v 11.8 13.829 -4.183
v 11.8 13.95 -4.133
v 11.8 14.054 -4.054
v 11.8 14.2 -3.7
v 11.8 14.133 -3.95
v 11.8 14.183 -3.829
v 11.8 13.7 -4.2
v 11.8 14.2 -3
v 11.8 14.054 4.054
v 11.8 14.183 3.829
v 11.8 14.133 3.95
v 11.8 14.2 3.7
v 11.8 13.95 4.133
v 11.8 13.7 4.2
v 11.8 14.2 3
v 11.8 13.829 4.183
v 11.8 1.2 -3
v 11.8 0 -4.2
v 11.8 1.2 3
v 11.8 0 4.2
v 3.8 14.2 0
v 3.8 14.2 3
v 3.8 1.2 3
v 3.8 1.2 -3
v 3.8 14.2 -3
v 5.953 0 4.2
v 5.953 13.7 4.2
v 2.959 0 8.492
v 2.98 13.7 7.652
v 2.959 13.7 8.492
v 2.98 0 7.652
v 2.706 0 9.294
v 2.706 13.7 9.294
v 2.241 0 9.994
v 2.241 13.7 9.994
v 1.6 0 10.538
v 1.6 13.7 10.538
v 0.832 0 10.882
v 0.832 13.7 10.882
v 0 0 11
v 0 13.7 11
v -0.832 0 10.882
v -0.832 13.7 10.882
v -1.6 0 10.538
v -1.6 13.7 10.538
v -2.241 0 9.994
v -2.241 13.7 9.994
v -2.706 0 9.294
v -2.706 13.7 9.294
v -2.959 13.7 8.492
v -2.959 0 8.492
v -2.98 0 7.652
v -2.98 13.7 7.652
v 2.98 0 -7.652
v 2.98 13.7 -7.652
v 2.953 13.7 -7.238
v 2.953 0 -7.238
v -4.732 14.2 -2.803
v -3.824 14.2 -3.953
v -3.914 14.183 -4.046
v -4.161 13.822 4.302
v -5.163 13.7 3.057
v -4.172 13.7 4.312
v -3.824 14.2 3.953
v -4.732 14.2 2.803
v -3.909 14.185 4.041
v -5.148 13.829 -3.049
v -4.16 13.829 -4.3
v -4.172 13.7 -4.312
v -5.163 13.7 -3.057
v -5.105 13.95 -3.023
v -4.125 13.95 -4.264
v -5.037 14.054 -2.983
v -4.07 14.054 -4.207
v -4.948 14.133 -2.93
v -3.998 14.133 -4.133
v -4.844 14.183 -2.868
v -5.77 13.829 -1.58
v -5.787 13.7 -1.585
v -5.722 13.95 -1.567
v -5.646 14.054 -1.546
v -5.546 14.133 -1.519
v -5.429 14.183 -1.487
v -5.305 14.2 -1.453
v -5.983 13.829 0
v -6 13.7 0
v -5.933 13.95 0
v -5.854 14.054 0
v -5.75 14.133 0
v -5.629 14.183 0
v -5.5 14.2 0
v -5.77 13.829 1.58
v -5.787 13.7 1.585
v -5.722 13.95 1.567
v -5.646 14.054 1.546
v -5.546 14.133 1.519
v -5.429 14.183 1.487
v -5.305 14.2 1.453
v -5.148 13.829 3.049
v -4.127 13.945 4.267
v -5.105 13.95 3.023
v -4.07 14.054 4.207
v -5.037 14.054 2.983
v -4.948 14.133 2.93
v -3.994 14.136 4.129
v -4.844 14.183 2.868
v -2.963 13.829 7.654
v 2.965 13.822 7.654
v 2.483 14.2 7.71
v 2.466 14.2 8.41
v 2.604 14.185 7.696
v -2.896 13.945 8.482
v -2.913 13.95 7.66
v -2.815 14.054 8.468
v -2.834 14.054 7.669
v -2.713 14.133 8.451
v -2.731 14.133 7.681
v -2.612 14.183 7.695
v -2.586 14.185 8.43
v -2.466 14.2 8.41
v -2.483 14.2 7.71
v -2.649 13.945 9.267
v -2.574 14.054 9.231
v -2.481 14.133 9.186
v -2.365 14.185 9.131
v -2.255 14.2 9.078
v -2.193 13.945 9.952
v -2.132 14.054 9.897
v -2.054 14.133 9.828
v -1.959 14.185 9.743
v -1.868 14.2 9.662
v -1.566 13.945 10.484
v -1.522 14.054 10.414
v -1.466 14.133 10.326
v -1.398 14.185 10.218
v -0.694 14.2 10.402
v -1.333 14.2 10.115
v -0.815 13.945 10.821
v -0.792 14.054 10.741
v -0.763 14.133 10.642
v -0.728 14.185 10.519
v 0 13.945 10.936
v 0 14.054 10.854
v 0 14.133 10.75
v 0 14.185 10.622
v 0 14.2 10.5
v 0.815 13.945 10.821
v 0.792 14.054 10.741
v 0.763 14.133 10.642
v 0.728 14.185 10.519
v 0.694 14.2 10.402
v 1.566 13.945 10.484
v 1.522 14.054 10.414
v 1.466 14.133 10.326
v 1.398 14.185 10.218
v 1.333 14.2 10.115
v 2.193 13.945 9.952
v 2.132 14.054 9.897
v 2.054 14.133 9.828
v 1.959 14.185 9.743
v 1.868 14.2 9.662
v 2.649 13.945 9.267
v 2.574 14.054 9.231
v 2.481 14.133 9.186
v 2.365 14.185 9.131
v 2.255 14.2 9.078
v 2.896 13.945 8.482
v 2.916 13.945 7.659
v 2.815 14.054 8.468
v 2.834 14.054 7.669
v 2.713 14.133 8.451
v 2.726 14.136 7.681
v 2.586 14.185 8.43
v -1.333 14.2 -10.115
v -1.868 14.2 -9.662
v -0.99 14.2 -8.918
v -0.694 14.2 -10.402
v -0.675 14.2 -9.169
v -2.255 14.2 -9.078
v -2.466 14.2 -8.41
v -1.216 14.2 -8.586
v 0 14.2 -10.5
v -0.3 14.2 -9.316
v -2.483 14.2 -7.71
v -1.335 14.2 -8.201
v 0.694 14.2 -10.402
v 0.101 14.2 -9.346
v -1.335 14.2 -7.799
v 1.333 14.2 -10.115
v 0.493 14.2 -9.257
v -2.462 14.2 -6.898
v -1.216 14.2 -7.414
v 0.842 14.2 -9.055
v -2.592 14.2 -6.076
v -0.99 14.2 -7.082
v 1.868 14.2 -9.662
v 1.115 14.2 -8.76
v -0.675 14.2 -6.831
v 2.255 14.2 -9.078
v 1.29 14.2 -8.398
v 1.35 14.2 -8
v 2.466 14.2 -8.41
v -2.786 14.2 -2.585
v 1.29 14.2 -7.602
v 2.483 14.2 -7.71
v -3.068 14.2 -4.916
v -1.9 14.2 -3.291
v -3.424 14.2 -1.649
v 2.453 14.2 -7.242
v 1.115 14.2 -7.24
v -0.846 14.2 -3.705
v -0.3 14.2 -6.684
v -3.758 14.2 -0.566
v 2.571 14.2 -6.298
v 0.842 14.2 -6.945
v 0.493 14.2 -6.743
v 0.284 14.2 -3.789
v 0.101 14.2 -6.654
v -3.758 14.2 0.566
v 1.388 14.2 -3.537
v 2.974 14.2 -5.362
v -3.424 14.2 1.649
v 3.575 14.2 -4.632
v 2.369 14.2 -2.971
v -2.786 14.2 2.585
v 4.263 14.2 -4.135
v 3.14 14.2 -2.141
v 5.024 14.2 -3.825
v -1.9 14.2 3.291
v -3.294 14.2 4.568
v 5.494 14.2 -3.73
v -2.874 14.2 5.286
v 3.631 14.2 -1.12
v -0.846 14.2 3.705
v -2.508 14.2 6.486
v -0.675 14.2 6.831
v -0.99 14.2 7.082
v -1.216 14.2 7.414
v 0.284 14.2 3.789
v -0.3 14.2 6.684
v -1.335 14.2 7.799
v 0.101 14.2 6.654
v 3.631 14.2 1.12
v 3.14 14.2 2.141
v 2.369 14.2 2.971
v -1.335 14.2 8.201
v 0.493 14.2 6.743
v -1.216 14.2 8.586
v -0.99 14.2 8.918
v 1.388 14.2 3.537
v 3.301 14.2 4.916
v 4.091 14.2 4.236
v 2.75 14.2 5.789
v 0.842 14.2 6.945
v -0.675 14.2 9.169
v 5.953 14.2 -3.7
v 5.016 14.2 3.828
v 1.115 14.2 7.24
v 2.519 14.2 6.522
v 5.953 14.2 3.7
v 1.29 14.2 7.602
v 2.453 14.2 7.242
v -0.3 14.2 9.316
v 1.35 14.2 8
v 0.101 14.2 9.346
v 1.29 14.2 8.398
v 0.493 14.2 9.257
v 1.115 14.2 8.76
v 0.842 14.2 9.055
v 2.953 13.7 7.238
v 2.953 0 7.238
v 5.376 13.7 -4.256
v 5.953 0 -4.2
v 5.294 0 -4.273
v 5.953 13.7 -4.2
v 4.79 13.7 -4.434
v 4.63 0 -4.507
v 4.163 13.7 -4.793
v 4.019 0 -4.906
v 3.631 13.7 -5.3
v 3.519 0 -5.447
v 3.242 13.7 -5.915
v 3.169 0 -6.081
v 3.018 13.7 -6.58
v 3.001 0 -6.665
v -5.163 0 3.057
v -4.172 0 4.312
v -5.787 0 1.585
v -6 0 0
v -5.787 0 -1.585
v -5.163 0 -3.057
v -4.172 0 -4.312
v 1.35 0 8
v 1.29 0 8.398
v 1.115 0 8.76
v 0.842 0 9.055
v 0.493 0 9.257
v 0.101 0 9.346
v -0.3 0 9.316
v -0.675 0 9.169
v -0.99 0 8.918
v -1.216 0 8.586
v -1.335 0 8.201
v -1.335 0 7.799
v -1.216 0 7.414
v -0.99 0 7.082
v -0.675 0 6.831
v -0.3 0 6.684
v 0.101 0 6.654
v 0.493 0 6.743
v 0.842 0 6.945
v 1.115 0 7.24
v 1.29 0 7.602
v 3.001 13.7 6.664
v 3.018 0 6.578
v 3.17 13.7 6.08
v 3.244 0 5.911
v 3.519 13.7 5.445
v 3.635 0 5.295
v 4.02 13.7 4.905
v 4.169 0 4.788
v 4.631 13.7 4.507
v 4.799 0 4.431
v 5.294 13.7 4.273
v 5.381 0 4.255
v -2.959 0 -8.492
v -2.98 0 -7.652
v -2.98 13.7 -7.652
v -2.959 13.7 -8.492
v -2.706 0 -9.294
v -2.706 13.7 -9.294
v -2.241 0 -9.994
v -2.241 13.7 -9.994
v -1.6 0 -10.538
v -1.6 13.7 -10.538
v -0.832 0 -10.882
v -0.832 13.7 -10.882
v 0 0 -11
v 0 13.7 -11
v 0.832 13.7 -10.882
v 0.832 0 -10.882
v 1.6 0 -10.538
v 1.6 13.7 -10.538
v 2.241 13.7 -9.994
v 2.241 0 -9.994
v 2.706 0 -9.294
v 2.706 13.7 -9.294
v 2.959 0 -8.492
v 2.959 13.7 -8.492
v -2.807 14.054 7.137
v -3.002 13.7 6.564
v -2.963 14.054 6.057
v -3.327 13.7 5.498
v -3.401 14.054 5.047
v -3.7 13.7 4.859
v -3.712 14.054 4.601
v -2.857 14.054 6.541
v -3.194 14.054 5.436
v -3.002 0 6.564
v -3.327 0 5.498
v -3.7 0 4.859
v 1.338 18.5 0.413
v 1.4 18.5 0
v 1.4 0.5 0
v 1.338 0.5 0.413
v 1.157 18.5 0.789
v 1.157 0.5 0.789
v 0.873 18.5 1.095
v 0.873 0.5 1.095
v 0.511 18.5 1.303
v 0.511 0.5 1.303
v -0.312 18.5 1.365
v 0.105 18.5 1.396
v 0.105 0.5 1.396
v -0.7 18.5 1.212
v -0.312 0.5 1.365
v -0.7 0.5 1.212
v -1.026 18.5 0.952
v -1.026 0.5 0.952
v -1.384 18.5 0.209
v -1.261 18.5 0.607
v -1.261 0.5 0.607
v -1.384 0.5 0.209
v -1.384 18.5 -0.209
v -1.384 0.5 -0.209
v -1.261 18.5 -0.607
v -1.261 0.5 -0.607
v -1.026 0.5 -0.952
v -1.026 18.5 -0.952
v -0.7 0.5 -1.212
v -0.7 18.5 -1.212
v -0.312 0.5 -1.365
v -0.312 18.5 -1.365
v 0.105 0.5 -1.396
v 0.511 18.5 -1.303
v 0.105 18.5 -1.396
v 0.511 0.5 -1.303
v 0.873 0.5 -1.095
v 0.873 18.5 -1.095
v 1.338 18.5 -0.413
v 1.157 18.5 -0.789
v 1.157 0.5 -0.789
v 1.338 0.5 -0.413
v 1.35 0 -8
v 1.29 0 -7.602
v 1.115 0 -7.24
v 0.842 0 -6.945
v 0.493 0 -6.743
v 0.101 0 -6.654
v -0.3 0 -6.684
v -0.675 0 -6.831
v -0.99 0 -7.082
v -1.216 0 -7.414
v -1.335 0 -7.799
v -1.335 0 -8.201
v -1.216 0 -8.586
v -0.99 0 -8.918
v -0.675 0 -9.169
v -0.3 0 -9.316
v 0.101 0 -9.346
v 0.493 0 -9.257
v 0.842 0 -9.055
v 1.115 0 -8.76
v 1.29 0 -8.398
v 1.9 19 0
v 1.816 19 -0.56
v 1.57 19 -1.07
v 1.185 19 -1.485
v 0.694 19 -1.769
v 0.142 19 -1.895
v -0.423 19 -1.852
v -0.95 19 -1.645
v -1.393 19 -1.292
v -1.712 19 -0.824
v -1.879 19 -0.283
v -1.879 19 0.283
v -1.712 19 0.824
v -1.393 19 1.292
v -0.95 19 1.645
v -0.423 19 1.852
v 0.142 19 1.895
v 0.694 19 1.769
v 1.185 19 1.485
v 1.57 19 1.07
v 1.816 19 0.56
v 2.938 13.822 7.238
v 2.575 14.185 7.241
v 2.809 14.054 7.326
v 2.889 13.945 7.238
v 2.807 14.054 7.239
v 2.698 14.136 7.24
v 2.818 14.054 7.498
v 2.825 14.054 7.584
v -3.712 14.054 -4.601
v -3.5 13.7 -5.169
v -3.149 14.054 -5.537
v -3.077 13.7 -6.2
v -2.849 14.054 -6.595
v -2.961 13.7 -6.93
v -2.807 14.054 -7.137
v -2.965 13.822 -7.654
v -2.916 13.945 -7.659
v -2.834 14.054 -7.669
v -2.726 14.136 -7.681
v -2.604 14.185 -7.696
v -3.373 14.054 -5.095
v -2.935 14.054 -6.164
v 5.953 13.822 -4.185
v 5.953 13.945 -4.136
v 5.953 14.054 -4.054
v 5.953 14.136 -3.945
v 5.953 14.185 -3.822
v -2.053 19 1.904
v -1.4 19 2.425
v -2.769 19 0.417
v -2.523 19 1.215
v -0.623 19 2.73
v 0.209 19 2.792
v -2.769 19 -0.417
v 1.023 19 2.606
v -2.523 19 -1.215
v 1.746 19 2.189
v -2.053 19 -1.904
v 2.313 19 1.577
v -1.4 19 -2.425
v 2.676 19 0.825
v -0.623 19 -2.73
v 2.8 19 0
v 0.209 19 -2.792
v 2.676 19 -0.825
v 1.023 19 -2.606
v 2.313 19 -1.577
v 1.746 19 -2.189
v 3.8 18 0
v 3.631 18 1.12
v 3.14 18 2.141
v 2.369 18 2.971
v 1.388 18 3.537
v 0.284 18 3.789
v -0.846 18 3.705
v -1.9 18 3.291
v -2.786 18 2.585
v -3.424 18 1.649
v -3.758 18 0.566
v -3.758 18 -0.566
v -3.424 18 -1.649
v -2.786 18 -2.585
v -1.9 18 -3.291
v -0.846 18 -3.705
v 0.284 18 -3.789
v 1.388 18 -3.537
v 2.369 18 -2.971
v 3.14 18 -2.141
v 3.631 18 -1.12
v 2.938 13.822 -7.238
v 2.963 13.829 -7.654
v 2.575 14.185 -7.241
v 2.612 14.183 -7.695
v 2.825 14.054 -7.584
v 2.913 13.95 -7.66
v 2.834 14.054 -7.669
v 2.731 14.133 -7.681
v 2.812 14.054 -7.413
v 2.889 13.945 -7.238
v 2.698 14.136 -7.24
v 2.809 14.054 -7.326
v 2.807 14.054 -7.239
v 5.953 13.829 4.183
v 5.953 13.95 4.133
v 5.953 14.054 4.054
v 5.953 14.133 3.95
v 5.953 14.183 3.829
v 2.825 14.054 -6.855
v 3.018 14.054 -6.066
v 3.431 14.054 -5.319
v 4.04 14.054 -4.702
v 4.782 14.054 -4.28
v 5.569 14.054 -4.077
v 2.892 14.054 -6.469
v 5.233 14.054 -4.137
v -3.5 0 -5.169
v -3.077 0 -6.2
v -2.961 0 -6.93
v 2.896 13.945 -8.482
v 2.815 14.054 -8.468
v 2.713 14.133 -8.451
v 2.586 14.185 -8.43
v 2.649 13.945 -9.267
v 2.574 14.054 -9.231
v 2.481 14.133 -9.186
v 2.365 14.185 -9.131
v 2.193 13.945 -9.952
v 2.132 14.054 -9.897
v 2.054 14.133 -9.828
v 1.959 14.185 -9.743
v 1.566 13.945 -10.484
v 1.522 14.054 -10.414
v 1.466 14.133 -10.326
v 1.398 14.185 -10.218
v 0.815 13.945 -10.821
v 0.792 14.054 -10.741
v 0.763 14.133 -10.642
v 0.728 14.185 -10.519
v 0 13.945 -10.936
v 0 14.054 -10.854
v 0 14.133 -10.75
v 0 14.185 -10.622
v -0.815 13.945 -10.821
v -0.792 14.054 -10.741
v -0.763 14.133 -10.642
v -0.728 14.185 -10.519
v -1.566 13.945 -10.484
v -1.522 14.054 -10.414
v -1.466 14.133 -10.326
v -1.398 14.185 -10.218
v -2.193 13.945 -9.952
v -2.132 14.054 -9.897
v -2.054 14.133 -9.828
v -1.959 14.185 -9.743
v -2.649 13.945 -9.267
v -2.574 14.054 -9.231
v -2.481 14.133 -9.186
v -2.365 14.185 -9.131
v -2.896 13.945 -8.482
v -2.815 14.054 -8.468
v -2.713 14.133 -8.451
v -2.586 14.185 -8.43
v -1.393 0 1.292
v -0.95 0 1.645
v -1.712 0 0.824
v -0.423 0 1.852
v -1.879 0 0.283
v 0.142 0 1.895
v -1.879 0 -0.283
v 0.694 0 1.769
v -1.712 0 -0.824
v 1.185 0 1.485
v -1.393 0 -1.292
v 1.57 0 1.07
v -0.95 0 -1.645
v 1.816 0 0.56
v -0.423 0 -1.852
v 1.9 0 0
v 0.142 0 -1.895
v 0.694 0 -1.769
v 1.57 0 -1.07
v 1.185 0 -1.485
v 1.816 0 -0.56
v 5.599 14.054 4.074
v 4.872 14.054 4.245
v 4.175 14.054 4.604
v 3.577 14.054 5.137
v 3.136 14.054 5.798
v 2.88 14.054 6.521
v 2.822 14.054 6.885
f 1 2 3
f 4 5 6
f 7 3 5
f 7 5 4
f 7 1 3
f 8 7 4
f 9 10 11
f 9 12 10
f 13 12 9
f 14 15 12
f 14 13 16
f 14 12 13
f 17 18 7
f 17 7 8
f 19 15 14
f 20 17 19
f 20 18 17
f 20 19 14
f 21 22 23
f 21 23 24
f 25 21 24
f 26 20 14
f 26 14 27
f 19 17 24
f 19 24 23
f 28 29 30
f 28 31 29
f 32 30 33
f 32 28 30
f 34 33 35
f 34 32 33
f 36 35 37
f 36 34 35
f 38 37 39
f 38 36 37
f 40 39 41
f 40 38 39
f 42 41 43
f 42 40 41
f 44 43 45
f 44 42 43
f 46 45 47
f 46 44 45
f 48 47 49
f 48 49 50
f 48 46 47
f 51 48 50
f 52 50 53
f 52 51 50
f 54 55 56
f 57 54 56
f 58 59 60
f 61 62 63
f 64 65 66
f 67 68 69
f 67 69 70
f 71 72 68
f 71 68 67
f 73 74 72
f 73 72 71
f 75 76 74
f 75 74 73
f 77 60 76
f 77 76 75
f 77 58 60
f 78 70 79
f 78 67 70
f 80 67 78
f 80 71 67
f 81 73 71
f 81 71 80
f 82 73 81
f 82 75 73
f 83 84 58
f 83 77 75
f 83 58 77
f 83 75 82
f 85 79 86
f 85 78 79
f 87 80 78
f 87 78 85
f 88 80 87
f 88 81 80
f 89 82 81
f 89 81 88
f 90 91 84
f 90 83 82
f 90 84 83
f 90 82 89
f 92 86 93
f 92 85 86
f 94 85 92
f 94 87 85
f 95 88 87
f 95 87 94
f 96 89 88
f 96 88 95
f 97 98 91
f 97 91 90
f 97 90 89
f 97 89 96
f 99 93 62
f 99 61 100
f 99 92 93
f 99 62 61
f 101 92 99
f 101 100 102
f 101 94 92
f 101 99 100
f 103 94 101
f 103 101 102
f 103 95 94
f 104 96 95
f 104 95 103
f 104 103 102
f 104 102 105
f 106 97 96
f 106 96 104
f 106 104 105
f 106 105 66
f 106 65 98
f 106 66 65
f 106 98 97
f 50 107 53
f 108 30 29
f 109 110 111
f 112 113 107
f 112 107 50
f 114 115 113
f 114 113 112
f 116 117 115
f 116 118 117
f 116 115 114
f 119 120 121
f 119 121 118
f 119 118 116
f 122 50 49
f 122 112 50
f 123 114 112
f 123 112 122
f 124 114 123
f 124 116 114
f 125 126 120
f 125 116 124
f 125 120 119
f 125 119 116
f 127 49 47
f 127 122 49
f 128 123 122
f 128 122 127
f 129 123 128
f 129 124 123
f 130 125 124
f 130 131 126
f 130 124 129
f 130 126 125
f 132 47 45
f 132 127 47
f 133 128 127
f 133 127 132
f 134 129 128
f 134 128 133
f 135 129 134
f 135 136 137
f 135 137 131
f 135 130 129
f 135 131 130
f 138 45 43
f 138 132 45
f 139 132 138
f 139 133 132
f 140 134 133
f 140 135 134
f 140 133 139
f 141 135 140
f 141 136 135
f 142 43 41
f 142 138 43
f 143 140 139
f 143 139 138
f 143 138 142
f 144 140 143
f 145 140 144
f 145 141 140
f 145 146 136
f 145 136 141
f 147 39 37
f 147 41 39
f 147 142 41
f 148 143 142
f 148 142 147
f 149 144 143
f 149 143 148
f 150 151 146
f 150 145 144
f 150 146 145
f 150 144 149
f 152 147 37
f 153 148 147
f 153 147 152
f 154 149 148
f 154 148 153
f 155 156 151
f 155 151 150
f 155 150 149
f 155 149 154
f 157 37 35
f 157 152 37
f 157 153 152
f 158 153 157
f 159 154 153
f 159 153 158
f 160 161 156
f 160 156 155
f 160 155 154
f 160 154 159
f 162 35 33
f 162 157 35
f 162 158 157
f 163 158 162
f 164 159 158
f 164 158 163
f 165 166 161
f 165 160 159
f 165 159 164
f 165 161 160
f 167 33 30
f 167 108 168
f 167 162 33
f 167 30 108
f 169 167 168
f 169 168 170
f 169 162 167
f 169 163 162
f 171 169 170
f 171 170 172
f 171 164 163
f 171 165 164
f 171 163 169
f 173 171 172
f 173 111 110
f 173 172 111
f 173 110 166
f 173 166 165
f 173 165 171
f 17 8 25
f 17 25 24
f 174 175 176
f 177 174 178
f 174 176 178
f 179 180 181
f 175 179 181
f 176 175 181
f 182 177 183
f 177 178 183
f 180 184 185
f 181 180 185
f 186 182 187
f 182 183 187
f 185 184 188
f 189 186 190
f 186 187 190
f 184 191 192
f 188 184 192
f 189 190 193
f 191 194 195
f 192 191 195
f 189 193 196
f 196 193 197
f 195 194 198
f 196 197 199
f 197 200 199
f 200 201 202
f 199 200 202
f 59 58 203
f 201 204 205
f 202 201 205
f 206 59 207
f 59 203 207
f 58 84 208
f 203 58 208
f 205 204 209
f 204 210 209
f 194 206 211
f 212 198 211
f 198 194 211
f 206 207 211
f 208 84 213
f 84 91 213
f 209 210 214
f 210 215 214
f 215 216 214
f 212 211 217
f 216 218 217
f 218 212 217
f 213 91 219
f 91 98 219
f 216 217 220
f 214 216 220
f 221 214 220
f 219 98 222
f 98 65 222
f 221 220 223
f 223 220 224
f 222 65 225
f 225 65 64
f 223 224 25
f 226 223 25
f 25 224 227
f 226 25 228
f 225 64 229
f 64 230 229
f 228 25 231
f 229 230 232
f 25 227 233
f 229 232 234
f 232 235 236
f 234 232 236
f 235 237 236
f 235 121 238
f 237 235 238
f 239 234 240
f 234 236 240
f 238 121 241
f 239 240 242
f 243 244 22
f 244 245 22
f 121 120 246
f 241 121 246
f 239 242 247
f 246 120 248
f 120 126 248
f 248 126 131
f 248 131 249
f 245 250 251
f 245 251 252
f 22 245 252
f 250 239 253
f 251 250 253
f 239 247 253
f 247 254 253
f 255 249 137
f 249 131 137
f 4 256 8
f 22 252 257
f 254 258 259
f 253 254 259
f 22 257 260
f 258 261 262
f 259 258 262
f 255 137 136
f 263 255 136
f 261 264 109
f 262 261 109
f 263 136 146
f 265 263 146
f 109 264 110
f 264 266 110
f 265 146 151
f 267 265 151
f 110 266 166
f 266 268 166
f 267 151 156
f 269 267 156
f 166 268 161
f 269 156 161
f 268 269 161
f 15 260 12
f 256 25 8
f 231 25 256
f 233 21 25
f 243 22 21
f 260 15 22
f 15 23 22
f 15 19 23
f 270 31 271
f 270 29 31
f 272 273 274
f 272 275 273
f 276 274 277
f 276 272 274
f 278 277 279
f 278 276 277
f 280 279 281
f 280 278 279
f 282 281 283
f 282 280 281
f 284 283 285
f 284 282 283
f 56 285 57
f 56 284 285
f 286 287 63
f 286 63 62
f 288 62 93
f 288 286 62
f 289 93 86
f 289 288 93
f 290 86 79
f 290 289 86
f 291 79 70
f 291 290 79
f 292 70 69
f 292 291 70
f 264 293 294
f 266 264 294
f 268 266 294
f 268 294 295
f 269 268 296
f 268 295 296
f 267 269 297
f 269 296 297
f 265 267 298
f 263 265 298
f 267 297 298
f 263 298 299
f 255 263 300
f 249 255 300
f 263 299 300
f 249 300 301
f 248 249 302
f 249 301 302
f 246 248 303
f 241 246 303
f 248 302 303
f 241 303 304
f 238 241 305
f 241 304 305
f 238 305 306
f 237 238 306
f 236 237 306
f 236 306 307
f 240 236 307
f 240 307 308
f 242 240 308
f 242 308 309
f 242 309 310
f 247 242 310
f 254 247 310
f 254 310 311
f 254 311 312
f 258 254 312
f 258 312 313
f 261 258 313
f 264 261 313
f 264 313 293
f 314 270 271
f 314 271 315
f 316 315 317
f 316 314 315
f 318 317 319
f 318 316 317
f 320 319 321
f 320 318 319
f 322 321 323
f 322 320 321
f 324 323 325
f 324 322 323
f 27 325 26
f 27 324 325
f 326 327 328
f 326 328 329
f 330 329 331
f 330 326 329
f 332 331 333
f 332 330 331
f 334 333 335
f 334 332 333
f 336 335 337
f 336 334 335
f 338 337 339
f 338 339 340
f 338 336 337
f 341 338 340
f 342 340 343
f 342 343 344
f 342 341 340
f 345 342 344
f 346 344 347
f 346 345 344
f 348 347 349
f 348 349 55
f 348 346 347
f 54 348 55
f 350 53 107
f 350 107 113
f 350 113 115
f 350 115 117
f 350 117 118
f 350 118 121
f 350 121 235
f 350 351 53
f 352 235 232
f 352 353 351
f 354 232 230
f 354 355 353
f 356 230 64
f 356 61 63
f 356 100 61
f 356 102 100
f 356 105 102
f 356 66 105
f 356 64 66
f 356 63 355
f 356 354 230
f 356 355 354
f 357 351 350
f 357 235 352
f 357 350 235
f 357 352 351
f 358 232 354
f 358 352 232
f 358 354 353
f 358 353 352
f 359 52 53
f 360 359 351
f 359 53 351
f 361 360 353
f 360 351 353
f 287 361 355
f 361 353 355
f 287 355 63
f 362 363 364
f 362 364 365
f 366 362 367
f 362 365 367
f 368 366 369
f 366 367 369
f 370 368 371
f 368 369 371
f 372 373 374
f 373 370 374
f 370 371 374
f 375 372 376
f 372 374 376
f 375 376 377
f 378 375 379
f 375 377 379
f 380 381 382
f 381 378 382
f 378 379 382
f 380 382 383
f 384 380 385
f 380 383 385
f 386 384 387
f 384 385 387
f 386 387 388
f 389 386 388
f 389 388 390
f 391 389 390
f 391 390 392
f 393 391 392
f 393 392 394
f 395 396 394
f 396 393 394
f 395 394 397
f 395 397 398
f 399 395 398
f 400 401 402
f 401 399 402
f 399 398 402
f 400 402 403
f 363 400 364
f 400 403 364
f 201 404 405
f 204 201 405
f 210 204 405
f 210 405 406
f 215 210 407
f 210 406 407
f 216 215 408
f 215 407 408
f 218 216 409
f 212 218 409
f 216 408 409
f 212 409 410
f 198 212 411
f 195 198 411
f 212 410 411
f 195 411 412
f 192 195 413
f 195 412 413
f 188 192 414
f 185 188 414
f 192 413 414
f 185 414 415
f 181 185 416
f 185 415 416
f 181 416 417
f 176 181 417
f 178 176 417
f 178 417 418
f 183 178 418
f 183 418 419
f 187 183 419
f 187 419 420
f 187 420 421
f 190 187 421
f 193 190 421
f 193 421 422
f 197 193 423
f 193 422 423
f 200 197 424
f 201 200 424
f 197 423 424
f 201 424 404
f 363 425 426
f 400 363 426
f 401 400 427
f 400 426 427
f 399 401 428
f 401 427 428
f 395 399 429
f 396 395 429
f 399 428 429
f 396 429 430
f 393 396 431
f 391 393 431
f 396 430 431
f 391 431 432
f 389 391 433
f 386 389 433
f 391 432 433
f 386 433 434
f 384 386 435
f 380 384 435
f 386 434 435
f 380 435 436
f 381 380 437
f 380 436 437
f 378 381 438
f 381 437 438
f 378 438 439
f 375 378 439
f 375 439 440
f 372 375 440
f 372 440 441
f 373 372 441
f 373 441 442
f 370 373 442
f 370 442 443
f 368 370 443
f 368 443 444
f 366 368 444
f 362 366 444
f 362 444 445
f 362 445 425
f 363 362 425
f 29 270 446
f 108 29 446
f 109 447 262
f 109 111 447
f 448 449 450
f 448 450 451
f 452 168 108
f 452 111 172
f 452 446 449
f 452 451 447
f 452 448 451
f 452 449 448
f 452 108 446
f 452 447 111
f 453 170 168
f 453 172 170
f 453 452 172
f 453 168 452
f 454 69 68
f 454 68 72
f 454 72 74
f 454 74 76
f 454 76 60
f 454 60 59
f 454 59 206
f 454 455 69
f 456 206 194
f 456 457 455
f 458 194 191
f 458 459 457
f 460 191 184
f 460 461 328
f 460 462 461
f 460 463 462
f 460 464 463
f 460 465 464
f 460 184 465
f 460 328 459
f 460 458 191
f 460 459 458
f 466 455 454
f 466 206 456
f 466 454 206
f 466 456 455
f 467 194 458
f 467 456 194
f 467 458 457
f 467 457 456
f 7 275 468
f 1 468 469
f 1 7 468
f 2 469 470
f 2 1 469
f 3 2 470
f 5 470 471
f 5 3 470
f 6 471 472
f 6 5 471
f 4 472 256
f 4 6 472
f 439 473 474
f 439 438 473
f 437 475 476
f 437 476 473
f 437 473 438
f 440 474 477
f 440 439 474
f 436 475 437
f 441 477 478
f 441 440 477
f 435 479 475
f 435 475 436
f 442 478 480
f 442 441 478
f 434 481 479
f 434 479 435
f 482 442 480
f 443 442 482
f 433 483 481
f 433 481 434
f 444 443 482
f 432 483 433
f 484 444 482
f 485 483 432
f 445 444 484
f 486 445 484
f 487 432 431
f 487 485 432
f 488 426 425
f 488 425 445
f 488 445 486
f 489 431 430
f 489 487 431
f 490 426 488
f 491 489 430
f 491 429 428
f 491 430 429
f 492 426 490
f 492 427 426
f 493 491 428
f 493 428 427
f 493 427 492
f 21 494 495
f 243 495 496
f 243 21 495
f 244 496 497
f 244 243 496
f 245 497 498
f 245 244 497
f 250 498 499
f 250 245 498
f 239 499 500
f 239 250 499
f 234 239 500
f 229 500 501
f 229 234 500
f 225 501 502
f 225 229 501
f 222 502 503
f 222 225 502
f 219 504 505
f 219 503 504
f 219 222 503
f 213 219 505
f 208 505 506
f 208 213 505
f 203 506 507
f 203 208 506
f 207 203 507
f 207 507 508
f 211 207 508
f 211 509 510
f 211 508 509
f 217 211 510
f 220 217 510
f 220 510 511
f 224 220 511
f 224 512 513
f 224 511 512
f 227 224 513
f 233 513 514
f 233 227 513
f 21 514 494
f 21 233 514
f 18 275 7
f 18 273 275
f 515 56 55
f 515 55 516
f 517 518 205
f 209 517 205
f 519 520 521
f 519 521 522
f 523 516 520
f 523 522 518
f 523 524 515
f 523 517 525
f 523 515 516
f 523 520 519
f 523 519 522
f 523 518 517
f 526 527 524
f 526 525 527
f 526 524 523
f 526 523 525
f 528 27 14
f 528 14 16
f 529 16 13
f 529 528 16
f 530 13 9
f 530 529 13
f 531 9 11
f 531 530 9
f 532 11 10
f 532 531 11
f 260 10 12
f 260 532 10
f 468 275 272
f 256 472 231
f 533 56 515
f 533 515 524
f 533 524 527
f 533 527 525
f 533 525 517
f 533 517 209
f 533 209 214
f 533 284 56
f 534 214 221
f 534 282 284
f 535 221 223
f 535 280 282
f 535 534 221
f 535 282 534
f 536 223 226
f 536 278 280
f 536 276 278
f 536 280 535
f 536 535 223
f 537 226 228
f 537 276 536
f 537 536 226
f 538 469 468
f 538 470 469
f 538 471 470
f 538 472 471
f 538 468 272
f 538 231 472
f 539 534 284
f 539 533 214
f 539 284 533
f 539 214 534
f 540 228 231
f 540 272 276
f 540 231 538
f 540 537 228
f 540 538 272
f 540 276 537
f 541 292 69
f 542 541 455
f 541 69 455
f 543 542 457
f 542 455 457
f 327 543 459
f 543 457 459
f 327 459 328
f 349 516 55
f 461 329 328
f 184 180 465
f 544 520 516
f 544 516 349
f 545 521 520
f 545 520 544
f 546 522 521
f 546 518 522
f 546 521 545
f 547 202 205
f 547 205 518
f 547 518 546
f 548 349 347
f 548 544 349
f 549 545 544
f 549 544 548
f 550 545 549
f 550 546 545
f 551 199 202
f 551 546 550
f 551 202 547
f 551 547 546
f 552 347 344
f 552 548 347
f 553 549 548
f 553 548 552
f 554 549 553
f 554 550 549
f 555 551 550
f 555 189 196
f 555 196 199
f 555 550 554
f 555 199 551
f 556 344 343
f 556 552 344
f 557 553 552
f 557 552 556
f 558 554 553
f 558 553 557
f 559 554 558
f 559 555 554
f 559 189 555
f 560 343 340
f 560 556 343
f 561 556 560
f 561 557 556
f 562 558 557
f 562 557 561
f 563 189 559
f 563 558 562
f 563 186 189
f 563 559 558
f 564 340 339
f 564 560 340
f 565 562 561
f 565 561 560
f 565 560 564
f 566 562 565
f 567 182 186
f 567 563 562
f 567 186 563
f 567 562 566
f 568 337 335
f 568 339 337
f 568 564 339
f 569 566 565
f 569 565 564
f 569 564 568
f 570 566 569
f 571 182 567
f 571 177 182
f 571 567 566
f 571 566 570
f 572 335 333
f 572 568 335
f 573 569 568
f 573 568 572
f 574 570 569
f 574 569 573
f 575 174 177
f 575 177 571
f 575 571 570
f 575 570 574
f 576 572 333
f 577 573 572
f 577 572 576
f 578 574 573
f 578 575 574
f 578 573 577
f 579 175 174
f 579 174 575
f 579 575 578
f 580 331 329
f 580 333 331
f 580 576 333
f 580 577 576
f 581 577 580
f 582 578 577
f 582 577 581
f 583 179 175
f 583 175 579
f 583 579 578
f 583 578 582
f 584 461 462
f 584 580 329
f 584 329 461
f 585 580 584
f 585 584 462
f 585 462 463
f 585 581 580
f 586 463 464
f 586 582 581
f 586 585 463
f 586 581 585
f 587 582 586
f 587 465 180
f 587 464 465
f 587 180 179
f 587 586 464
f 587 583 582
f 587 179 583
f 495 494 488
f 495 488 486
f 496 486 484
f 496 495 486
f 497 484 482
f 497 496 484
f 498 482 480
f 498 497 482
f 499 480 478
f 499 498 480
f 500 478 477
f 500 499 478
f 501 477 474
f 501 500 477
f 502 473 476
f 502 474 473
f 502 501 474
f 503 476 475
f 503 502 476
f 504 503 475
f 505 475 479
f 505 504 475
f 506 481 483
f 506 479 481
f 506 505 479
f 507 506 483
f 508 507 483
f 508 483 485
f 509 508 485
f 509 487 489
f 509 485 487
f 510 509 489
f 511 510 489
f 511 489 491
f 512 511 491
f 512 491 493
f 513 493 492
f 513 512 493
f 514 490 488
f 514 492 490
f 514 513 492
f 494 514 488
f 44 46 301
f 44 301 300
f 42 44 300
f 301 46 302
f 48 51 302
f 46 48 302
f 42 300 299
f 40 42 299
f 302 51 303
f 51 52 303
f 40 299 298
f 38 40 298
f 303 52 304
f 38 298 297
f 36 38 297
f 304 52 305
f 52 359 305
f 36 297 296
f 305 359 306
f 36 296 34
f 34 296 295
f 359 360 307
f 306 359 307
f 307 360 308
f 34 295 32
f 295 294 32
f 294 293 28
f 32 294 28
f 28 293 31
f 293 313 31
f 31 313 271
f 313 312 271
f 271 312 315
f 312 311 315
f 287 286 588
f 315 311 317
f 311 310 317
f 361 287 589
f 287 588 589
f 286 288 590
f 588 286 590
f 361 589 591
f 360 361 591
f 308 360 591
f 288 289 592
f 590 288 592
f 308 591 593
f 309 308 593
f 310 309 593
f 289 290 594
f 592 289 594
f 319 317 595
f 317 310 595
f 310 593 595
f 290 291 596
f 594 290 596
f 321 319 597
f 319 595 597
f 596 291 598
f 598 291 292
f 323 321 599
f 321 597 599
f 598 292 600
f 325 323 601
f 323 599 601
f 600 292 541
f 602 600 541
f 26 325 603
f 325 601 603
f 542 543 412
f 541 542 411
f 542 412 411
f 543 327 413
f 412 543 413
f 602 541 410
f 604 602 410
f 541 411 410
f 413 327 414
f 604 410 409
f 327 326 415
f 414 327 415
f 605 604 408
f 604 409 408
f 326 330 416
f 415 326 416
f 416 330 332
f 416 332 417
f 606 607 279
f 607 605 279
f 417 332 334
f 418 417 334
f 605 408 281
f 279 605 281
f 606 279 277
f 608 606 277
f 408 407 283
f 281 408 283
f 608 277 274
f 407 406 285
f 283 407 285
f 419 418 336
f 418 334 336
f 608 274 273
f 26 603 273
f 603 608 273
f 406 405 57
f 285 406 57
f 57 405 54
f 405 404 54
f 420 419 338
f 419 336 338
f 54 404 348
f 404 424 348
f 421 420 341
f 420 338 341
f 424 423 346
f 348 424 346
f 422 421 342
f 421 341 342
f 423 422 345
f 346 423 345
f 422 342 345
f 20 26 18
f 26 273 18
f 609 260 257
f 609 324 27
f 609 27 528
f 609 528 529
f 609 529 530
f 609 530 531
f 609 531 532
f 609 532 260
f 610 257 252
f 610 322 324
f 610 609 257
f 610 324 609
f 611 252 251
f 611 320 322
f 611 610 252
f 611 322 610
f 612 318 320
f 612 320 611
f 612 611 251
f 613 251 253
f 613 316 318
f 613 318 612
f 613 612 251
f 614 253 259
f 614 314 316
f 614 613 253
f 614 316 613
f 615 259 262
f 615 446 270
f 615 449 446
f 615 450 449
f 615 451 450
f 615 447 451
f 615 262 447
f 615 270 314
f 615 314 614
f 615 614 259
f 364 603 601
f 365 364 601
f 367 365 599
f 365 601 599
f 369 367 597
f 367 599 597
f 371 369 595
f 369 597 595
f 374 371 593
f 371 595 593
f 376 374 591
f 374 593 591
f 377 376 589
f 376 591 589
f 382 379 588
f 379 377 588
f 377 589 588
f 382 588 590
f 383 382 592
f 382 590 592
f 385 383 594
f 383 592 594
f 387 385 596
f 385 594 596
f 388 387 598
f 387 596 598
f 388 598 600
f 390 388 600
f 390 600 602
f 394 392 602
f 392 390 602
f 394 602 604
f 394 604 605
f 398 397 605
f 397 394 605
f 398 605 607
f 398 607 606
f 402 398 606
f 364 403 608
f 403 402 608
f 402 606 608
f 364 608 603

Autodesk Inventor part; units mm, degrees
ref_plane "YZ Plane" through (0, 0, 0) normal (1, 0, 0) x (0, 1, 0)
ref_plane "XZ Plane" through (0, 0, 0) normal (0, 1, 0) x (-1, 0, 0)
ref_plane "XY Plane" through (0, 0, 0) normal (0, 0, 1) x (1, 0, 0)
sketch "Sketch1" plane through (0, 0, 0) normal (0, 0, 1) x (1, 0, 0)
  line L0 (0, 0) -> (0, 38.4841) construction
  line L1 (2.8, 19) -> (3.8, 18)
  line L2 (3.8, 18) -> (3.8, 0)
  line L3 (2.8, 19) -> (1.4, 19)
  line L4 (1.4, 19) -> (1.4, 0)
  line L5 (1.4, 0) -> (3.8, 0)
  dimension "d1" = 1.4
  dimension "d8" = 1
  dimension "d20" = 3.8
  dimension "d46" = 19
revolve "Revolution1" add sketch "Sketch1" angle 360 about axis through (0, 0, 0) along (0, 1, 0)
chamfer "Chamfer1" distance 0.5 angle 45 2 edges at (-1.4, 19, 0) (-1.4, 0, 0)
sketch "Sketch6" plane through (0, 0, 0) normal (0, -1, 0) x (1, 0, 0)
  line L0 (0, 0) -> (0, -8) construction
  circle A0 centre (0, 8) radius 3
  circle A1 centre (0, -8) radius 3
  circle A2 centre (0, 0) radius 6
  line L1 (0, 0) -> (0, 8) construction
  circle A3 centre (0, 8) radius 1.35
  circle A4 centre (0, -8) radius 1.35
  circle A5 centre (0, 0) radius 1.9 projected
  line L2 (11.8, 4.2) -> (2, 4.2)
  line L3 (2, 4.2) -> (2, -4.2)
  line L4 (2, -4.2) -> (11.8, -4.2)
  line L5 (11.8, -4.2) -> (11.8, 4.2)
  line L6 (0, 0) -> (2, 4.2) construction
  line L7 (0, 0) -> (2, -4.2) construction
  point P0 (1.9111, -5.6875)
  point P1 (1.9111, 5.6875)
  point P2 (-1.9111, 5.6875)
  point P3 (-1.9111, -5.6875)
  point P4 (4.2849, 4.2)
  point P5 (4.2849, -4.2)
  dimension "d24" = 6
  dimension "d26" = 8
  dimension "d27" = 12
  dimension "d28" = 2.7
  dimension "d33" = 2
  dimension "d34" = 8.4
  dimension "d35" = 11.8
extrude "Extrusion3" add sketch "Sketch6" against normal blind 14.2
fillet "Fillet1" radius 4 4 edges at (-1.9111, 7.1, 5.6875) (1.9111, 7.1, 5.6875) (1.9111, 7.1, -5.6875) (-1.9111, 7.1, -5.6875)
sketch "Sketch7" plane through (0, 0, -8) normal (0, -1, 0) x (1, 0, 0)
  circle A0 centre (0, 8) radius 6
sketch "Sketch8" plane through (0, 0, 8) normal (0, -1, 0) x (1, 0, 0)
  point P0 (0, -8)
sketch "Sketch10" plane through (11.8, 0, 4.2) normal (1, 0, 0) x (0, 0, -1)
  line L0 (7.2, 1.2) -> (1.2, 1.2)
  line L1 (1.2, 1.2) -> (1.2, 14.2)
  line L2 (1.2, 14.2) -> (7.2, 14.2)
  line L3 (7.2, 14.2) -> (7.2, 1.2)
  line L4 (7.2, 1.2) -> (4.2, 0) construction
  line L5 (4.2, 0) -> (1.2, 1.2) construction
  line L6 (8.4, 0) -> (0, 0) projected
  dimension "d39" = 6
  dimension "d40" = 1.2
  dimension "d41" = 13
extrude "Extrusion4" cut sketch "Sketch10" against normal blind 8
fillet "Fillet4" radius 3 2 edges at (4.2849, 7.1, 4.2) (4.2849, 7.1, -4.2)
fillet "Fillet5" radius 0.5 7 edges at (2.961, 14.2, -7.446) (-6, 14.2, 0) (2.961, 14.2, 7.446) (0, 14.2, 11) (8.8764, 14.2, 4.2) (8.8764, 14.2, -4.2) (0, 14.2, -11)
properties part number "caster-bng"
